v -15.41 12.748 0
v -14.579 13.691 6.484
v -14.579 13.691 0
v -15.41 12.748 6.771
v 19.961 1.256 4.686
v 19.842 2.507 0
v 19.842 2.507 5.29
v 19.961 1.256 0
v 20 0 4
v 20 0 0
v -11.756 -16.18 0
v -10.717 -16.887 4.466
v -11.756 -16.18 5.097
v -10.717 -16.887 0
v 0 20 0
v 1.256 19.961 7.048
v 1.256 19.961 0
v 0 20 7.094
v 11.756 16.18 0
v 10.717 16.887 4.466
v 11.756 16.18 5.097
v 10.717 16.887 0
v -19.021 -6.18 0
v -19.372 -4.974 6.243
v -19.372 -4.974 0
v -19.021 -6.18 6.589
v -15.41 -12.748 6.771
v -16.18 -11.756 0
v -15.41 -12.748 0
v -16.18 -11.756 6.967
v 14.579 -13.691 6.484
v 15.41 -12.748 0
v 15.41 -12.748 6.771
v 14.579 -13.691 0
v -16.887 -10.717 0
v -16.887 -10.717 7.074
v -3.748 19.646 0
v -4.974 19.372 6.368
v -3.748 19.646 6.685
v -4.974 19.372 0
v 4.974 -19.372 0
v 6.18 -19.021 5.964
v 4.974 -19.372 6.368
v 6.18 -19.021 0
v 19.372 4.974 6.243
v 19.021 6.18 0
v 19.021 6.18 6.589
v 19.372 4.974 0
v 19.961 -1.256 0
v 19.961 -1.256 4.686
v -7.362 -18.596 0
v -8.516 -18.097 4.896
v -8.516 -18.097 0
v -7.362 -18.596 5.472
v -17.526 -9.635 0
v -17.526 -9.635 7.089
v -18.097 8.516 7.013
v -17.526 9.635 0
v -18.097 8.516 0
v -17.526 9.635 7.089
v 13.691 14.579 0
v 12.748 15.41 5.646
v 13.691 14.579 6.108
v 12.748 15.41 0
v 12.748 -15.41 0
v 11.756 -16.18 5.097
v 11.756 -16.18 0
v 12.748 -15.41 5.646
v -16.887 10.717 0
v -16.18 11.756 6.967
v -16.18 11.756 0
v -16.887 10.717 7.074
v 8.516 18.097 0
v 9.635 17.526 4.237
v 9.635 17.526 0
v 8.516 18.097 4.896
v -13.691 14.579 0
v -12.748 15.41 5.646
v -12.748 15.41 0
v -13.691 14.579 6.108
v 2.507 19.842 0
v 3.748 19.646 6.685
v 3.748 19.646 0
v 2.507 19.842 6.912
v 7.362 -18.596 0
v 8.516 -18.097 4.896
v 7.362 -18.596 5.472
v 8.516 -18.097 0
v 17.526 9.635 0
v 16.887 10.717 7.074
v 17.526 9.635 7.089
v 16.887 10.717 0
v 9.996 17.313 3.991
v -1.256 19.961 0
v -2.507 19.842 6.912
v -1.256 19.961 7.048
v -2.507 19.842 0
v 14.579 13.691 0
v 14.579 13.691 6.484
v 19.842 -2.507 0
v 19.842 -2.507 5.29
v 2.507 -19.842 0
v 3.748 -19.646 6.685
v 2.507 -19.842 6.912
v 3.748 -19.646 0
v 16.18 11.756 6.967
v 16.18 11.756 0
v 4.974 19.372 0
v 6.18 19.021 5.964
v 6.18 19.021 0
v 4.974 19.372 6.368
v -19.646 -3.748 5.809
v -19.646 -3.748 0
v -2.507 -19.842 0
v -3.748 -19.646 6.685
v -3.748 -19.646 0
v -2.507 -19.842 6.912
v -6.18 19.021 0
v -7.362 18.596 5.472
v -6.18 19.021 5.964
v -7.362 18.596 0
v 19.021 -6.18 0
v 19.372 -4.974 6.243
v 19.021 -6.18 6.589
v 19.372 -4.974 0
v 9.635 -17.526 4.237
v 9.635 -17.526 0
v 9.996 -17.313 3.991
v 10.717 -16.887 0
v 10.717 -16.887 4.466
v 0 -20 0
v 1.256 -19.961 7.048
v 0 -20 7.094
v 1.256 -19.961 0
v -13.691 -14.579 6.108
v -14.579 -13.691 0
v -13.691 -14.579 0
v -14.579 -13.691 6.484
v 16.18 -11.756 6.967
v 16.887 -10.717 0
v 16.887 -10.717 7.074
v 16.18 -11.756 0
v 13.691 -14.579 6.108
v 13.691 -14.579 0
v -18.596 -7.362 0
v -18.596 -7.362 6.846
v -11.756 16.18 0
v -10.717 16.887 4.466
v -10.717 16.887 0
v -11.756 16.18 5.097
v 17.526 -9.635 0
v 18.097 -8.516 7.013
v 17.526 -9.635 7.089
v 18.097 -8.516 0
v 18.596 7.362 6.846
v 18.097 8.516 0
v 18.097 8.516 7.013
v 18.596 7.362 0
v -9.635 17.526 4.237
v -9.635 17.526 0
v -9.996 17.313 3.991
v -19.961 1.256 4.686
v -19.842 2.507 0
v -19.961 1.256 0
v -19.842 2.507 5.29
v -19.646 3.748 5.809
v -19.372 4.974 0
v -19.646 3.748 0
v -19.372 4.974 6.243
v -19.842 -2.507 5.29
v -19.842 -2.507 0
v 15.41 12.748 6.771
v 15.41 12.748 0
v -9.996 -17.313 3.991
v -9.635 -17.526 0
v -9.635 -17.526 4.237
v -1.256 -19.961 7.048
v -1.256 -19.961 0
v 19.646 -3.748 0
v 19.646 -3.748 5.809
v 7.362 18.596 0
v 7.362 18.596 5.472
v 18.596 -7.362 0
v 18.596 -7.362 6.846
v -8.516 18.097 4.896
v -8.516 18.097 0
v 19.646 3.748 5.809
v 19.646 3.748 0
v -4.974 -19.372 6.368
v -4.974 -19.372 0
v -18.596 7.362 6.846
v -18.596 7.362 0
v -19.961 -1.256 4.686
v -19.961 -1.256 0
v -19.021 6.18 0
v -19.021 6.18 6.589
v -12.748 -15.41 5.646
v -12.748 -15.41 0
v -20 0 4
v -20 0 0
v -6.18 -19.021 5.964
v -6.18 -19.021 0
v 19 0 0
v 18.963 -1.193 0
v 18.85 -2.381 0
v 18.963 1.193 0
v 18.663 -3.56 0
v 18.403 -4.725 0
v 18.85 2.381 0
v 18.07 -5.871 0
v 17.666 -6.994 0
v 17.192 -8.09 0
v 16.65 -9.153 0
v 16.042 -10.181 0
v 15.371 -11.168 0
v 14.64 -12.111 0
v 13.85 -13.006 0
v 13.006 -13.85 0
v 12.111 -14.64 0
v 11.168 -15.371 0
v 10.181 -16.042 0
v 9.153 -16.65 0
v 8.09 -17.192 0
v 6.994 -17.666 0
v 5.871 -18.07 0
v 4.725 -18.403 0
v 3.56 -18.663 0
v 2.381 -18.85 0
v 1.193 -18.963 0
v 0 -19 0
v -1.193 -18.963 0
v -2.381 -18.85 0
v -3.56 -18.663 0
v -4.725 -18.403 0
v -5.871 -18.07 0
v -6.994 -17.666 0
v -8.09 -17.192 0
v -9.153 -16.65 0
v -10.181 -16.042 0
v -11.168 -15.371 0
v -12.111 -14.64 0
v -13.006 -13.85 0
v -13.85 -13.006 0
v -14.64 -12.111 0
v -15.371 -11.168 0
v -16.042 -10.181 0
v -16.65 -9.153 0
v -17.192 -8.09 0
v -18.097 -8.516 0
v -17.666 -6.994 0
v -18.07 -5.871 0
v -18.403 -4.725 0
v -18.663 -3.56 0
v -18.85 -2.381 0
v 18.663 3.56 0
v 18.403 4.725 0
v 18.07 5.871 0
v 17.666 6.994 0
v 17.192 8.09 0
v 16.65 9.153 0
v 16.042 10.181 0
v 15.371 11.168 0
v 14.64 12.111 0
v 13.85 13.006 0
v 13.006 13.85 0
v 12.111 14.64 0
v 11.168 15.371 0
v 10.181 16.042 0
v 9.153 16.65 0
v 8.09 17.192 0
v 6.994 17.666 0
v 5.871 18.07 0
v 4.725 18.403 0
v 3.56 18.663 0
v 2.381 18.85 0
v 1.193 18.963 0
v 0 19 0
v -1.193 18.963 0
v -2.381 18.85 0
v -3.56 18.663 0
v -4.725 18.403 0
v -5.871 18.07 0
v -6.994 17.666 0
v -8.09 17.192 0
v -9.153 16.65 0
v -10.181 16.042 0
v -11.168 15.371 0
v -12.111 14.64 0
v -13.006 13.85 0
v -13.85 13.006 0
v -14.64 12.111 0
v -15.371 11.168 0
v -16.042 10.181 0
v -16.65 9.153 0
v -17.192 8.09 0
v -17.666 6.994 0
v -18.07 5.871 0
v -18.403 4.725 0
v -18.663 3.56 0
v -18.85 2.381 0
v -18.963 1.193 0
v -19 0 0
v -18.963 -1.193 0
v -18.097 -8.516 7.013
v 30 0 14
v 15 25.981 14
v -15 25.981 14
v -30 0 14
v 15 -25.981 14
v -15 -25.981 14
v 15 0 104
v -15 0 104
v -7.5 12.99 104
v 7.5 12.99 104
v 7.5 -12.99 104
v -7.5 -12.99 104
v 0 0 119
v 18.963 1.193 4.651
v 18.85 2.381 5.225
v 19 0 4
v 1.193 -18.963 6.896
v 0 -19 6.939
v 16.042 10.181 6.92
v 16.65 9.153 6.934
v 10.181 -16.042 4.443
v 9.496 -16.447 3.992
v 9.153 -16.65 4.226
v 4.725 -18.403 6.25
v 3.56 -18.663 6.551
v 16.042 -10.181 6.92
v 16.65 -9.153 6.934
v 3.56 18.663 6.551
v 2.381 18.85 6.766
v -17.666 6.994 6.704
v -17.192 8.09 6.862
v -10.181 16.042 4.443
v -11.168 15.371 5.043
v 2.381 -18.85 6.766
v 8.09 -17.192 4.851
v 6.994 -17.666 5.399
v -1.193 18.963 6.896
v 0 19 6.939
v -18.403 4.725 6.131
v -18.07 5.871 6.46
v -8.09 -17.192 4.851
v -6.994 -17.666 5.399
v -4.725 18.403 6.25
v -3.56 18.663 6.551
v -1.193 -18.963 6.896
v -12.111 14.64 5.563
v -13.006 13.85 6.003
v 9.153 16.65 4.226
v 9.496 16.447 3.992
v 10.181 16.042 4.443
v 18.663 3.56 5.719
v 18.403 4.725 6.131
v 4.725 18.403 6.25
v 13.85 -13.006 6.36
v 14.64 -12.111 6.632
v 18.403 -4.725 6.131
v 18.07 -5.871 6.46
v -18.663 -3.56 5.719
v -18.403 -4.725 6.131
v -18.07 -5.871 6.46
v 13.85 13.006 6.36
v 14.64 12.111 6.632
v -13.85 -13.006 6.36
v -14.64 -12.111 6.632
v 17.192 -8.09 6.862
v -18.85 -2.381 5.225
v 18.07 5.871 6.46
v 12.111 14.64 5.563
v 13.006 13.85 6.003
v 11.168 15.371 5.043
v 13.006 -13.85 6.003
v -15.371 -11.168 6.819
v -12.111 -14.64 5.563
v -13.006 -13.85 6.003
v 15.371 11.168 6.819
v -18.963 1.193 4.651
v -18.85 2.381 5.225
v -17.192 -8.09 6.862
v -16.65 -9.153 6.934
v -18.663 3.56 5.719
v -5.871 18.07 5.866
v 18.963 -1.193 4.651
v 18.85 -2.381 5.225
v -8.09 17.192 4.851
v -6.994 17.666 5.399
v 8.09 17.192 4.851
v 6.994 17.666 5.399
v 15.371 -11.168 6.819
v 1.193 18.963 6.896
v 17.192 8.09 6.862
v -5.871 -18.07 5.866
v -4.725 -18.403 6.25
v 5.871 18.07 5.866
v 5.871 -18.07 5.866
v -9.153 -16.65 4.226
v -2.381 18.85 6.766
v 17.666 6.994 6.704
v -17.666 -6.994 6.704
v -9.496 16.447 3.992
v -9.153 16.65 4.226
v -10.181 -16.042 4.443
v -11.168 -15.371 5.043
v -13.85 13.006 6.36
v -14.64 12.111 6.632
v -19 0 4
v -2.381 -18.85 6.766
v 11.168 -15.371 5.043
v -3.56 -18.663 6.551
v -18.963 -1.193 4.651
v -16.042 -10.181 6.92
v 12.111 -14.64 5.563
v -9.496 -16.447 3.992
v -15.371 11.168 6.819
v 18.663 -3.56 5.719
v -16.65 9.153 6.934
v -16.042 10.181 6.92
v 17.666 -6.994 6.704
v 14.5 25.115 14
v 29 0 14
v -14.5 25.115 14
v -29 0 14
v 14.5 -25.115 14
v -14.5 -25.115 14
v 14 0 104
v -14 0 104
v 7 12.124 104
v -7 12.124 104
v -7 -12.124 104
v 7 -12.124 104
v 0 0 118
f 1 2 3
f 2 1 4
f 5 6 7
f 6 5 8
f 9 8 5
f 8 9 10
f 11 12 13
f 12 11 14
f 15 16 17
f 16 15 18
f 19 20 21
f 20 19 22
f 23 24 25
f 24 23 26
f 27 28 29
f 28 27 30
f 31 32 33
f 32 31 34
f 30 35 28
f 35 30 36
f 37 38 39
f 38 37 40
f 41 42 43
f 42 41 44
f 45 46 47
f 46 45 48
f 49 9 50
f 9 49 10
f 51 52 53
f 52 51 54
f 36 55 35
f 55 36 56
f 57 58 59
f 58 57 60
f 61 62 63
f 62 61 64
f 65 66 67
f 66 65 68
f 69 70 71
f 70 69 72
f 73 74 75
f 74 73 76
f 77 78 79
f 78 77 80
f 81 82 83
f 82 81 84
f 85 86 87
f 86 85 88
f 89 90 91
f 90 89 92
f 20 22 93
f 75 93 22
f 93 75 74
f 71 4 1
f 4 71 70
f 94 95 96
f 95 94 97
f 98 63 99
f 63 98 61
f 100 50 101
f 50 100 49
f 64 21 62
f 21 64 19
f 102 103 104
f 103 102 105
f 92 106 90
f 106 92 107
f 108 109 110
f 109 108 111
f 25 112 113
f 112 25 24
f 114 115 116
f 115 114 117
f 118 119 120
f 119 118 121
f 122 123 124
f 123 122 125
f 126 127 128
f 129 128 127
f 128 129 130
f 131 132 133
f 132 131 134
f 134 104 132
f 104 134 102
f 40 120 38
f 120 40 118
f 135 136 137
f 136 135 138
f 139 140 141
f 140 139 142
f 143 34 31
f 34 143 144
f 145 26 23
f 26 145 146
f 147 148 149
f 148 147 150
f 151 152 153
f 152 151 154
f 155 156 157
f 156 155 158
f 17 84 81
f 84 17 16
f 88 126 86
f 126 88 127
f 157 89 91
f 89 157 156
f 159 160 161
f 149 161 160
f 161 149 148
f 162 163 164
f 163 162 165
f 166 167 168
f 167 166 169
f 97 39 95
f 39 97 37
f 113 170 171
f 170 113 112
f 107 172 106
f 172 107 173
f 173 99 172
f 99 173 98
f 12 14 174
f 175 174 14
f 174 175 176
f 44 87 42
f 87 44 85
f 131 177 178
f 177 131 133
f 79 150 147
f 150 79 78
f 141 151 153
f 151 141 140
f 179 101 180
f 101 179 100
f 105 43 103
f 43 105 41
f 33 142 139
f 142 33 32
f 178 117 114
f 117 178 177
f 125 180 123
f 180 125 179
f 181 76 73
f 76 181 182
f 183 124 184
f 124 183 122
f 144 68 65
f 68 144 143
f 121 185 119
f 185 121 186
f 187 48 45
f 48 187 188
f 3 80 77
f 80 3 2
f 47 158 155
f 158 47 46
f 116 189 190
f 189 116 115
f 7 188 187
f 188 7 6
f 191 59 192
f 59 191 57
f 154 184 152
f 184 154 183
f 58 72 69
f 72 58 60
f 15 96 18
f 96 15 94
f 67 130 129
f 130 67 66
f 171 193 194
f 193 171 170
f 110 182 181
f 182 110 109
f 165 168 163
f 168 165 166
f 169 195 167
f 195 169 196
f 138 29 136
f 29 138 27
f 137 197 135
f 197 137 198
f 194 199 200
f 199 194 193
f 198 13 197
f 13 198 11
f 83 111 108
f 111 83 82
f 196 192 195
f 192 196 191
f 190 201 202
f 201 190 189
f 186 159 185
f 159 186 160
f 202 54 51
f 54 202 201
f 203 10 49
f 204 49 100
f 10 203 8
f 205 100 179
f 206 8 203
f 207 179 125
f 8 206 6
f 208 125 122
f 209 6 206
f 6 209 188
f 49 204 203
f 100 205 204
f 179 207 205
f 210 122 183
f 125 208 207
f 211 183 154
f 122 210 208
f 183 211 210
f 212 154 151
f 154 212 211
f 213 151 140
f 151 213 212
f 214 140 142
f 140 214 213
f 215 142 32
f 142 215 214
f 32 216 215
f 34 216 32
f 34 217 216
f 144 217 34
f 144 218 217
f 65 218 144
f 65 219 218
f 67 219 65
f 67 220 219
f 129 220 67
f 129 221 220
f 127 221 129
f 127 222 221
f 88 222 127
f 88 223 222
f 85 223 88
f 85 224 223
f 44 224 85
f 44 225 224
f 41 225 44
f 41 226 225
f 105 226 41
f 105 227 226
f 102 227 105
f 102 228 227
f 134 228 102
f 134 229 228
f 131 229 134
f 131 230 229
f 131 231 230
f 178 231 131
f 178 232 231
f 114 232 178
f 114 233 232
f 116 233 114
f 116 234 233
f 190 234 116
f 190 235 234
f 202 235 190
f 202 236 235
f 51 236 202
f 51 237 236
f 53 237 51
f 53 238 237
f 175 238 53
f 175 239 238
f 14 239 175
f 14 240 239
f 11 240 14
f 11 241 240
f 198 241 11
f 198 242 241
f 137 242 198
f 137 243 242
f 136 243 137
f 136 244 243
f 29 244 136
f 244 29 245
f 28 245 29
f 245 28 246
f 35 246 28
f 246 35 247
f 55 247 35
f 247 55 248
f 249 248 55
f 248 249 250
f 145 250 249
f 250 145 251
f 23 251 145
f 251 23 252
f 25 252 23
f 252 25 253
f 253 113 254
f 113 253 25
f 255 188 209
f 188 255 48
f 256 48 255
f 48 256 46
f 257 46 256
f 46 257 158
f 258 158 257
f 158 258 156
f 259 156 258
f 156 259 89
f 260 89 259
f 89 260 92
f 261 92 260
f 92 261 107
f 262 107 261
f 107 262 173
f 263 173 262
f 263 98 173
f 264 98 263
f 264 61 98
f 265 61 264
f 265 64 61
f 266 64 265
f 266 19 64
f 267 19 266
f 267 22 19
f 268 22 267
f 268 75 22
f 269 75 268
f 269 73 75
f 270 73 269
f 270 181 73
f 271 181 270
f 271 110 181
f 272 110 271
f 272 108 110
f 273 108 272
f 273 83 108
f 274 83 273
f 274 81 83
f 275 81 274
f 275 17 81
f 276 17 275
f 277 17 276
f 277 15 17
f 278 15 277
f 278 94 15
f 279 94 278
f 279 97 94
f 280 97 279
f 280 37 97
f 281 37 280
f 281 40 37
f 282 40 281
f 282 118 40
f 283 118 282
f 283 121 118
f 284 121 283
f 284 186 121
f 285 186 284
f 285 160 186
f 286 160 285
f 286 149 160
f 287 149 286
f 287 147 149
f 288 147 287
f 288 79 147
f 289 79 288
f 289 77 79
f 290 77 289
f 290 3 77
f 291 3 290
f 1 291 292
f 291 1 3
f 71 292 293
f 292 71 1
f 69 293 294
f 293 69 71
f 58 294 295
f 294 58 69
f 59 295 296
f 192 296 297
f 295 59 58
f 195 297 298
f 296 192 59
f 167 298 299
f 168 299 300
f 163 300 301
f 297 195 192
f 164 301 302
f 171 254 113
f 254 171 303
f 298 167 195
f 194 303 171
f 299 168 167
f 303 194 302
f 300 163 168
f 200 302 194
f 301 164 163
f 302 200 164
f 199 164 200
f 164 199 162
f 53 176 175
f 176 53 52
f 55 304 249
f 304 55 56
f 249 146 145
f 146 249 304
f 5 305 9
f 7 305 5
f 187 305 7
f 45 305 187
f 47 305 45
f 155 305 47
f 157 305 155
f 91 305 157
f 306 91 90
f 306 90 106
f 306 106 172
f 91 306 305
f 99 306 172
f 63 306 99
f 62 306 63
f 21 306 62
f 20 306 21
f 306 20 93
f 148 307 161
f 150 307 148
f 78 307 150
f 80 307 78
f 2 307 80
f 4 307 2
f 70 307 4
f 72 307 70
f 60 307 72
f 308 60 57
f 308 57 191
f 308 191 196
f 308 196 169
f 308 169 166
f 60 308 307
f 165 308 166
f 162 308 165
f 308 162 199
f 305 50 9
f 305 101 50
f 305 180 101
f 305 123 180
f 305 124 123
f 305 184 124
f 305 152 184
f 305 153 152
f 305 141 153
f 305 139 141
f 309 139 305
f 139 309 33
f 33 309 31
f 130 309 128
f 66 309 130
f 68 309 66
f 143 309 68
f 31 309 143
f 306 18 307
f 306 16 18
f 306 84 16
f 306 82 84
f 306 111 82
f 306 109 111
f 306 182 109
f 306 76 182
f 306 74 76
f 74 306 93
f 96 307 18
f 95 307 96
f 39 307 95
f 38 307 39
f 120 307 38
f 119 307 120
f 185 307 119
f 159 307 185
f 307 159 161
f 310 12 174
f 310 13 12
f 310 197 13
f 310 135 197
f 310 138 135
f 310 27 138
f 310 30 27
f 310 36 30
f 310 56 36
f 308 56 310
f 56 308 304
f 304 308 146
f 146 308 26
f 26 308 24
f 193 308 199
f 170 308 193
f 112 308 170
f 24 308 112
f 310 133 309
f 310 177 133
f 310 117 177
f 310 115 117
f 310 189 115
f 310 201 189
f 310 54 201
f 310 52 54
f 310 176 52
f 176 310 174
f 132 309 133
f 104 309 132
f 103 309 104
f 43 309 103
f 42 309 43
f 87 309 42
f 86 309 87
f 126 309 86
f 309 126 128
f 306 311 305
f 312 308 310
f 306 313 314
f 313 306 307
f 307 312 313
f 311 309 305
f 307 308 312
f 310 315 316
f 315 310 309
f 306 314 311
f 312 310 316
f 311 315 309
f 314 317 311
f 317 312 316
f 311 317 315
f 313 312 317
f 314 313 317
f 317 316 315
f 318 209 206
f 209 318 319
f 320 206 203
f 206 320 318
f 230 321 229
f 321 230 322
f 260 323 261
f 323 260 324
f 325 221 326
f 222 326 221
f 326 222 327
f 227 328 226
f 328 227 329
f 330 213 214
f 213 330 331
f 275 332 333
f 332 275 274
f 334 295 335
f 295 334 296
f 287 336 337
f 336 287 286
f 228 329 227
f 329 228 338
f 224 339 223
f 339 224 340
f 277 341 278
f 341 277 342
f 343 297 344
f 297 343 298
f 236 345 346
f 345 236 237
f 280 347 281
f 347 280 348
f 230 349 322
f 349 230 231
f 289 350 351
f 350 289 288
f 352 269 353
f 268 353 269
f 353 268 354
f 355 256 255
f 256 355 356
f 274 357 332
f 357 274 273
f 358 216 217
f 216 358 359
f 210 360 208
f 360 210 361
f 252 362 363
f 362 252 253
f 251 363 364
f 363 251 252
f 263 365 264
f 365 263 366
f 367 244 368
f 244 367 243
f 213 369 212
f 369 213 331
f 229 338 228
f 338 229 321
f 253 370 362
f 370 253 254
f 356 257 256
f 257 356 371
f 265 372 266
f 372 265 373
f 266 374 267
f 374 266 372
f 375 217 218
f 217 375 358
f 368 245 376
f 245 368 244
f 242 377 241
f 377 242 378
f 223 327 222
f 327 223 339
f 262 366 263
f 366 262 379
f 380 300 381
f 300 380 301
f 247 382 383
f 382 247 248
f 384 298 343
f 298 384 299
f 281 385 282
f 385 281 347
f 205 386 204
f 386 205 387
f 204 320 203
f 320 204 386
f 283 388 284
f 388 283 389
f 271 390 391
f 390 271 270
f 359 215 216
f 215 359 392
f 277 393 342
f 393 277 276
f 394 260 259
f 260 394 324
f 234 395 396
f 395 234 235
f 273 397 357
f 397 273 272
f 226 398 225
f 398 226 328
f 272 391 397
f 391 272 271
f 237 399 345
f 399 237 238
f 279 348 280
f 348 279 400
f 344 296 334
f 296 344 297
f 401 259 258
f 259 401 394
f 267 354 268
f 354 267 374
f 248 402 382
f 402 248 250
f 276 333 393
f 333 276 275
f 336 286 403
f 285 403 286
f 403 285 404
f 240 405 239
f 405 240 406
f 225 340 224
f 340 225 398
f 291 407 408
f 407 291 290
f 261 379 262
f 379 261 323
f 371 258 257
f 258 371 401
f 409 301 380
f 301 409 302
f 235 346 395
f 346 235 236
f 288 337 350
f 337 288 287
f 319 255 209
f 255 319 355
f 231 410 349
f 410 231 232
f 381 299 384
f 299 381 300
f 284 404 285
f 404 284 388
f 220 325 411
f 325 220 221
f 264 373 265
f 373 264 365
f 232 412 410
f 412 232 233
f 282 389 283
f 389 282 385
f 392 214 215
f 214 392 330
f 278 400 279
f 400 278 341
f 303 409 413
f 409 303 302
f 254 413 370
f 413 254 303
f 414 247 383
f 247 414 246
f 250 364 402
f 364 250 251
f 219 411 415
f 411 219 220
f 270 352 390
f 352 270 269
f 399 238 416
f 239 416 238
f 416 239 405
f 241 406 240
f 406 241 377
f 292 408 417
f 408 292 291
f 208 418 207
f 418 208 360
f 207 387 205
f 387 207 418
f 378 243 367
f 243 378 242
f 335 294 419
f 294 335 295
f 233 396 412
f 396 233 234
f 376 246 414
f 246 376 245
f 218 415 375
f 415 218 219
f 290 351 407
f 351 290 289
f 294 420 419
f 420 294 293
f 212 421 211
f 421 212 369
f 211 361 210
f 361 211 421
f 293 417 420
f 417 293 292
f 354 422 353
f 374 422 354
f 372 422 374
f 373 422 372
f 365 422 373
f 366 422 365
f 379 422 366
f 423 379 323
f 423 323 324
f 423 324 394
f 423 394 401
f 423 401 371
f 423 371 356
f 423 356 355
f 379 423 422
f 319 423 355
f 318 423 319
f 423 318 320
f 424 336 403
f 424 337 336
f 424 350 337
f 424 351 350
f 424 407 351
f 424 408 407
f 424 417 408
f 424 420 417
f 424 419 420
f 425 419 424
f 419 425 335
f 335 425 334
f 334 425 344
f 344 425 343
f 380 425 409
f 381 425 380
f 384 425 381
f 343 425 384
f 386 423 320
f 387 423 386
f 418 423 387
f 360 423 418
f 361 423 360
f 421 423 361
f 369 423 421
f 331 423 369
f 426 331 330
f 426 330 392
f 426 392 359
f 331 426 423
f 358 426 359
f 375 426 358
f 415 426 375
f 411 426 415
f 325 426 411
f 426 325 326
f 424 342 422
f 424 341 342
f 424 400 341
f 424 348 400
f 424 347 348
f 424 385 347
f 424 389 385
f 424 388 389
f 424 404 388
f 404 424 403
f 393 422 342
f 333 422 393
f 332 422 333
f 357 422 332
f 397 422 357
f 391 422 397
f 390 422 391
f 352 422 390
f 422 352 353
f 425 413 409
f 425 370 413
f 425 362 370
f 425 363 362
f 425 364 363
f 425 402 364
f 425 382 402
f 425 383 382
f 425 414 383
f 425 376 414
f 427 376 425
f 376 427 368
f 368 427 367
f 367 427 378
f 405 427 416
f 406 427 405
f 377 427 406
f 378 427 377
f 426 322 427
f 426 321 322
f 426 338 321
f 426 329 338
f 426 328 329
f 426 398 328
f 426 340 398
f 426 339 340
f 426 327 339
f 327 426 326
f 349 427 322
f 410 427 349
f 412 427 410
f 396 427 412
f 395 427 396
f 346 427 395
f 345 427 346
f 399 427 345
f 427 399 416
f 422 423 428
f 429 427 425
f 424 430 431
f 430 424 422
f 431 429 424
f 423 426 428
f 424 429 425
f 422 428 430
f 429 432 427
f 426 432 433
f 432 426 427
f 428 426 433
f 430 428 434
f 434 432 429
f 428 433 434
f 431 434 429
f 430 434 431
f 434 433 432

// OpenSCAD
//Make EPIC custom crystal lamps

//https://www.youtube.com/watch?v=HZKu9QMN5xw&ab_channel=bigclivedotcom

//Lamp cap obelisk quartz crystal.
//You can adjust the five variables below
base=40;      //Diameter of base for lamp
rim=4;            //Length of rim at base
size=60;        //Diameter of crystal
scaling=1.5;  //Scale of crystal length (default 1.5)
facets=6;       //number of faces (default 6)
//Don't change variables below here
halfsize=size/2;
upper=halfsize-(base/2)+rim;
$fn=facets;
difference(){
union(){
//outer body
translate([0,0,0])
cylinder(h=4+rim,d1=base,d2=base,$fn=100);
translate([0,0,-(base/2)+rim])
cylinder(h=halfsize,d1=0,d2=size);
translate([0,0,upper])
cylinder(h=size*scaling,d1=size,d2=size/2);
translate([0,0,upper+size*scaling])
cylinder(h=size/4,d1=size/2,d2=0);
}
//Inner core.
translate([0,0,-1])
cylinder(h=6+rim,d1=base-2,d2=base-2,$fn=100);
translate([0,0,-(base/2)+rim+1])
cylinder(h=halfsize-1,d1=0,d2=size-2);
translate([0,0,upper])
cylinder(h=size*scaling,d1=size-2,d2=(size/2)-2);
translate([0,0,upper+size*scaling])
cylinder(h=(size/4)-1,d1=(size/2)-2,d2=0);
translate([-halfsize,-halfsize,-halfsize])
cube([size,size,halfsize]);
//x-ray box
//translate([-80,-80,-50])
//cube([160,80,280]);
}
